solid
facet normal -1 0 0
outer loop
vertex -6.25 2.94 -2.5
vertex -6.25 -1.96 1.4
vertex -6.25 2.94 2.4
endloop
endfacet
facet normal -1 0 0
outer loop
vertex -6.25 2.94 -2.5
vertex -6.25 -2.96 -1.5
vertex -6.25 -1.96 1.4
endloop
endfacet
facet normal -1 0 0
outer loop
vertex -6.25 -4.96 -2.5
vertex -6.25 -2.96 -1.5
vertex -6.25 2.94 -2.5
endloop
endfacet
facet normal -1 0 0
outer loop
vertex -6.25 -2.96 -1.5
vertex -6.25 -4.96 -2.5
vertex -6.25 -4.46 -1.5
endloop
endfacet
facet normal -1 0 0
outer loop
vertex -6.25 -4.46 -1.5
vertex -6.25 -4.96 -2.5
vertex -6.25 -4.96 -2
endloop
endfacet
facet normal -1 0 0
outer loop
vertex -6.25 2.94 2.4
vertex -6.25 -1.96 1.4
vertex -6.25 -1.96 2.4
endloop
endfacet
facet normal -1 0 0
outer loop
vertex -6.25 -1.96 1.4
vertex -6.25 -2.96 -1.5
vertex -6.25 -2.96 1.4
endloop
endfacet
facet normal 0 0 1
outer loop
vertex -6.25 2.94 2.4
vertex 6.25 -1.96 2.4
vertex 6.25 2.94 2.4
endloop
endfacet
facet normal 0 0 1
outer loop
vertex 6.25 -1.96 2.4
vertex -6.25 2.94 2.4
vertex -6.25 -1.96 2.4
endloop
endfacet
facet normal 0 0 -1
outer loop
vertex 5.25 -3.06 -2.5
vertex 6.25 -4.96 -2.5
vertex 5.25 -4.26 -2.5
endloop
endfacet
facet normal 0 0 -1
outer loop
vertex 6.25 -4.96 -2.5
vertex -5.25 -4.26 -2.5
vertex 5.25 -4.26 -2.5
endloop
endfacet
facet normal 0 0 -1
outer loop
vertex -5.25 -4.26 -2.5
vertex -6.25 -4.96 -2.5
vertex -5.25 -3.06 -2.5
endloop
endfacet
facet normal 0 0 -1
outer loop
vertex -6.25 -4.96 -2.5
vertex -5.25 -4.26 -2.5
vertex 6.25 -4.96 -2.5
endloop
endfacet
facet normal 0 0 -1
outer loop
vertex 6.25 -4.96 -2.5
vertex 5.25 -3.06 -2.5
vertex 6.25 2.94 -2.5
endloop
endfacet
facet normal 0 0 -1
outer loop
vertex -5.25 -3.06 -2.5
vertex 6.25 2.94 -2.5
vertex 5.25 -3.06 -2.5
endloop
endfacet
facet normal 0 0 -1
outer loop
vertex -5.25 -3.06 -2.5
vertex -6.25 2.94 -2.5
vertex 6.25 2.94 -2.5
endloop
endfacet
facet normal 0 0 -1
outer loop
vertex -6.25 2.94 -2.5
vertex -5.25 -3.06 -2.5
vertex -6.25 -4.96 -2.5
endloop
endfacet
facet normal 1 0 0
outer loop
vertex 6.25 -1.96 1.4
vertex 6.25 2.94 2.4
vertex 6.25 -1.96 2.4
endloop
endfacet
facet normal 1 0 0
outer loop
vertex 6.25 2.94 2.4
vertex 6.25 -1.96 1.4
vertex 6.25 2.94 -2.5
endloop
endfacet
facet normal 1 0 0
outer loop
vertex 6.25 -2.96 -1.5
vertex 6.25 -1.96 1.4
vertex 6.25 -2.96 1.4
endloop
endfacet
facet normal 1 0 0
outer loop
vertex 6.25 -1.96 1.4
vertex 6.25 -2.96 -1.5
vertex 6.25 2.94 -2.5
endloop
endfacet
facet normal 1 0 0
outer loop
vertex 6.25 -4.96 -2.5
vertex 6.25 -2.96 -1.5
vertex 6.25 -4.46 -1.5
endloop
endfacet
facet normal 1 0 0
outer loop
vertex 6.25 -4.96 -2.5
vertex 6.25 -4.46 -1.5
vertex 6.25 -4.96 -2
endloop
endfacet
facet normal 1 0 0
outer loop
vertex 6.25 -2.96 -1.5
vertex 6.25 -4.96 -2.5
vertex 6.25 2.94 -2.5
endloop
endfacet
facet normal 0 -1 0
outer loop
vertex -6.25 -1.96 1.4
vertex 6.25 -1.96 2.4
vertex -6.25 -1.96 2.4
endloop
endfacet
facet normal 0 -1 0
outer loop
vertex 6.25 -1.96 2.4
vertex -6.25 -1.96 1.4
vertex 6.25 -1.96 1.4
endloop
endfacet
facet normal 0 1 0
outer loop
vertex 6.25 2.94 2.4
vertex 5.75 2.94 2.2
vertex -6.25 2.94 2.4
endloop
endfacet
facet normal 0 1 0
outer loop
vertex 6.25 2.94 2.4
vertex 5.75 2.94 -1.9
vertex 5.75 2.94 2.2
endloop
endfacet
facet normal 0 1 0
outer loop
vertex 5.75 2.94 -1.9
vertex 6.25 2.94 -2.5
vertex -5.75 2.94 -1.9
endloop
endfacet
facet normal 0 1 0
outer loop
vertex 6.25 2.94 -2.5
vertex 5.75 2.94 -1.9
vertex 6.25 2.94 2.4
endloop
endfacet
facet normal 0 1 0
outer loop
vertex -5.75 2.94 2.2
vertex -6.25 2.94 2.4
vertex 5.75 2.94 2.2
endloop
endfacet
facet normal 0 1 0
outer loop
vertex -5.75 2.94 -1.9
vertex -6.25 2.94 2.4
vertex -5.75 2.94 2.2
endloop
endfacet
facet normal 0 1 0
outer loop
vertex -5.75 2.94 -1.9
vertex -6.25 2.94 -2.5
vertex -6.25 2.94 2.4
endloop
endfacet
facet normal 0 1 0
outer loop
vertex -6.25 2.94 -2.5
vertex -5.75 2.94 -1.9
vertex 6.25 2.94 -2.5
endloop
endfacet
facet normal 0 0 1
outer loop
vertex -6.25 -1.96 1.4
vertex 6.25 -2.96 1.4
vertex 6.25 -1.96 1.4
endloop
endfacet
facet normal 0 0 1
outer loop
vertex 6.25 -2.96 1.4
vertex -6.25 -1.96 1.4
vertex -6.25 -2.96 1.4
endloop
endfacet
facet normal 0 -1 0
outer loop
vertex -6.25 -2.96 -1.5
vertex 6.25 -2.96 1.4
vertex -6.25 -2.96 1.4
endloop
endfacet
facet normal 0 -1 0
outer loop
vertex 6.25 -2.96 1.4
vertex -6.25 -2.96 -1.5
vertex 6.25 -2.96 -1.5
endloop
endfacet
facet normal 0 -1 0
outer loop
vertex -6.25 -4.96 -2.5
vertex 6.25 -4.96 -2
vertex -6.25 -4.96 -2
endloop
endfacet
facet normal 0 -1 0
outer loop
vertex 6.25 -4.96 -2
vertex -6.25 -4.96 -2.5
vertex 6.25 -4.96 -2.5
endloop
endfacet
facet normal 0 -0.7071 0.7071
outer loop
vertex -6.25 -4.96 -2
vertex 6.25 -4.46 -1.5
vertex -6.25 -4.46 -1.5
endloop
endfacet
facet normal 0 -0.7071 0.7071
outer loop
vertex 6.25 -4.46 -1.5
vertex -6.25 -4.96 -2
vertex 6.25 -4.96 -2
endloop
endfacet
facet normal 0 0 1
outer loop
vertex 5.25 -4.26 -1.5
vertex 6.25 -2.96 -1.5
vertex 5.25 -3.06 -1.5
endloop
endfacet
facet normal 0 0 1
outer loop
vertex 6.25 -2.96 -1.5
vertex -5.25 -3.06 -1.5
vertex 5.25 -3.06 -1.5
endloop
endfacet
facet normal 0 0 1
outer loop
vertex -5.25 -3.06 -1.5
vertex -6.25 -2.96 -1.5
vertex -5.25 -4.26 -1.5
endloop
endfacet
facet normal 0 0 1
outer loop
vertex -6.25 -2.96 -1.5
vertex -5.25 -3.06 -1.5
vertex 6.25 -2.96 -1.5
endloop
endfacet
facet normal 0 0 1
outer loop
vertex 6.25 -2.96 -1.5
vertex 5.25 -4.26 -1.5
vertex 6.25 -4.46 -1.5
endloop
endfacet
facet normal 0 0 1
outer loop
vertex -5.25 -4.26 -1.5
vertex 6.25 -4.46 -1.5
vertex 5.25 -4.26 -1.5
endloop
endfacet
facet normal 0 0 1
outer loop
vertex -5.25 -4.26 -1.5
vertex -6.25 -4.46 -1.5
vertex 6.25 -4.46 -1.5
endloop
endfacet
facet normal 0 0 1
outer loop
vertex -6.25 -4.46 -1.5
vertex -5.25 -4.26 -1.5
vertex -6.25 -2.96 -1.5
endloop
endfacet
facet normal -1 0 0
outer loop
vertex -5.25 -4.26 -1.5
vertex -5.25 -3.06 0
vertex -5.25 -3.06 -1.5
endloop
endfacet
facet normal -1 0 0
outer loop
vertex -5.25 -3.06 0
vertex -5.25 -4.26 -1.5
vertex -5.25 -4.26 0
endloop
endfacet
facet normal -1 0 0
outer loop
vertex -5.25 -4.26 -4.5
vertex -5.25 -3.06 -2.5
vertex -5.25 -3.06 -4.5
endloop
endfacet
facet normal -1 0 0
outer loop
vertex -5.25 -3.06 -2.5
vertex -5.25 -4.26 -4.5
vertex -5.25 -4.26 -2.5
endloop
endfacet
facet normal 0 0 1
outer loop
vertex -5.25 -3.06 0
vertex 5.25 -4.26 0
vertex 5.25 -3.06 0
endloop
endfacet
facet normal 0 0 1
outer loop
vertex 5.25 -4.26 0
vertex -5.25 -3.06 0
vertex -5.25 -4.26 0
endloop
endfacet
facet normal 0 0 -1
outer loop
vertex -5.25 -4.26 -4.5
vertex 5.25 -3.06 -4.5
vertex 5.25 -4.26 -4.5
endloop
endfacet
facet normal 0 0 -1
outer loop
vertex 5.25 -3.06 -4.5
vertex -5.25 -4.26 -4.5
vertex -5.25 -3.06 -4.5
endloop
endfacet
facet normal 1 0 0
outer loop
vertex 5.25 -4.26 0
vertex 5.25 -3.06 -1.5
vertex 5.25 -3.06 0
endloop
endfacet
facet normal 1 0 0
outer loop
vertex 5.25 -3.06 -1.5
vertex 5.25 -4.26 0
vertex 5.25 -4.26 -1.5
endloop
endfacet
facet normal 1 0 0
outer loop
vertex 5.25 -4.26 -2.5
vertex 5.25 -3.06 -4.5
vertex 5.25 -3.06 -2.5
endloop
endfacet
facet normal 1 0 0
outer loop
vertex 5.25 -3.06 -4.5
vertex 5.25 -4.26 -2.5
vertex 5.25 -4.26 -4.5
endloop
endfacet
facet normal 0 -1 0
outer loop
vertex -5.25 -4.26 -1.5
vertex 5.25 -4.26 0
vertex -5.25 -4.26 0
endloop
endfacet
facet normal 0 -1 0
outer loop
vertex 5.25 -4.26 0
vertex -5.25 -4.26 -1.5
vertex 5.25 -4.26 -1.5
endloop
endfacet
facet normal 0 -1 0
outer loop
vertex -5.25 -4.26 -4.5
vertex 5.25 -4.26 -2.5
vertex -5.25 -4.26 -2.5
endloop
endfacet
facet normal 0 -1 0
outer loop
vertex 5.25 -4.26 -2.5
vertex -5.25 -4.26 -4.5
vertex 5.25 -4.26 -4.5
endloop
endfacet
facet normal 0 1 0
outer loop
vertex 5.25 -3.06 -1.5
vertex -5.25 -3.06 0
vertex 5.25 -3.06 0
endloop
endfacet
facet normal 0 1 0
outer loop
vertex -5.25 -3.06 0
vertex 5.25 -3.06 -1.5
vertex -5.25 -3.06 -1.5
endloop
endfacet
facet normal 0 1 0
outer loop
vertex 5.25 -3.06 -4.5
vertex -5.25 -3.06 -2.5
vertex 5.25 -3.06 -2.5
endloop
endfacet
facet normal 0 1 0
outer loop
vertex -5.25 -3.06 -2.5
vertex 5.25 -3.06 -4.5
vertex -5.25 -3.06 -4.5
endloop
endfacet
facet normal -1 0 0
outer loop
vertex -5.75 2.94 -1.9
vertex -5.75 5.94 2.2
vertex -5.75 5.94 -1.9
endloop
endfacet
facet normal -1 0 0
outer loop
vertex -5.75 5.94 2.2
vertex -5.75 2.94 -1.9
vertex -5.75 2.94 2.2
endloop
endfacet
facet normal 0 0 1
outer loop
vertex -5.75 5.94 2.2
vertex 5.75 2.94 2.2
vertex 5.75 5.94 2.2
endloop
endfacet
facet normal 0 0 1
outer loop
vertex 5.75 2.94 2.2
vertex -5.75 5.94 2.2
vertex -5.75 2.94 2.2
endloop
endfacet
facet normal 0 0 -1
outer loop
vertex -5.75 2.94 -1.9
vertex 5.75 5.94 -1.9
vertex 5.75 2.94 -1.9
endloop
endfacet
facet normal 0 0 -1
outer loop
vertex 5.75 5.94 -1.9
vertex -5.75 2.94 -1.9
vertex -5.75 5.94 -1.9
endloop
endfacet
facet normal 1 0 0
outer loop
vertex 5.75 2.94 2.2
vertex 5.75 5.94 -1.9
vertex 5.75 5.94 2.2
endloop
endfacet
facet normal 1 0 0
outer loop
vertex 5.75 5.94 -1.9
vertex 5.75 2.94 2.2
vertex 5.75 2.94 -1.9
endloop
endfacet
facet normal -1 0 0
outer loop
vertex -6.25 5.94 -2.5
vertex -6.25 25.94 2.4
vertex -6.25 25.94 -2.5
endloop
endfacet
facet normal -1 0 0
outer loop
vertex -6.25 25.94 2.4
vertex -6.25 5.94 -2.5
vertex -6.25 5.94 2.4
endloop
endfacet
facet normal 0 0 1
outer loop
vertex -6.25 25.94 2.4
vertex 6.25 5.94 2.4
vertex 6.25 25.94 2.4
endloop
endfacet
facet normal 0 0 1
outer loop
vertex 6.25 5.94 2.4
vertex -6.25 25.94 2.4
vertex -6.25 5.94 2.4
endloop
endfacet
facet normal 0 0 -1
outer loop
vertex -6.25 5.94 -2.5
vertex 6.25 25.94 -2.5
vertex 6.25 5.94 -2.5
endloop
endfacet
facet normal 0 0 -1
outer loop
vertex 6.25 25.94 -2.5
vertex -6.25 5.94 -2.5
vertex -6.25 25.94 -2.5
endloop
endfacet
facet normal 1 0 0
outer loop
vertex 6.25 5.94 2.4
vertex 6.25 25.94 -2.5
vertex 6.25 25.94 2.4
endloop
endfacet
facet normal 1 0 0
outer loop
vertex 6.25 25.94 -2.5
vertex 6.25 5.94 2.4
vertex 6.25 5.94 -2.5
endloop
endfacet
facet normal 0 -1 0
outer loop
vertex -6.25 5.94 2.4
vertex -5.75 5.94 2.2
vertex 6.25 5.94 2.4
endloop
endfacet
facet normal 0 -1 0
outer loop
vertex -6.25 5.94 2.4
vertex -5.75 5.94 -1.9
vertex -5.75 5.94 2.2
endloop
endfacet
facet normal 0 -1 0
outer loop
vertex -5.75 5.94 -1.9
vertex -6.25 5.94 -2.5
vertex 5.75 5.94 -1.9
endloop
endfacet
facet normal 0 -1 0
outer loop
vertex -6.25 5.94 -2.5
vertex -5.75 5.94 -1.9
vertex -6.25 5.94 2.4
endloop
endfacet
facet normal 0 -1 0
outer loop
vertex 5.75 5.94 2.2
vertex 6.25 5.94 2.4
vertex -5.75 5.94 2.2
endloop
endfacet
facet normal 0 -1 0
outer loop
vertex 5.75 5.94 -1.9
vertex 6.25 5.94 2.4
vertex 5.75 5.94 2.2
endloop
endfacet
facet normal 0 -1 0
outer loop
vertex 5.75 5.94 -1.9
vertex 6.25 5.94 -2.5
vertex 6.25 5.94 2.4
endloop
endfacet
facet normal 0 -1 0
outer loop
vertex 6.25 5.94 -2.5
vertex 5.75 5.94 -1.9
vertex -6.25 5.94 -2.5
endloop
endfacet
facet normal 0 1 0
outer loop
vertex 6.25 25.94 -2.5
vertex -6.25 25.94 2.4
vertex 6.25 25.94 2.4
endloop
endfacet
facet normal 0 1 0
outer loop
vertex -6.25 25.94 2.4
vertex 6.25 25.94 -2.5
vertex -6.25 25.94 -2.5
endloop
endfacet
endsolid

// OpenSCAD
N=4;
A=2.5+N*2.5;
rotate([0,0,180])
translate([-A/2,-2.94,-2.5])
{
	cube([A,4.9,4.9]);
	cube([A,5.9,3.9]);
	hull()
	{
		cube([A,7.4,1]);
		cube([A,7.9,0.5]);
	}
	translate([1,6,-2])cube([A-2,1.2,4.5]); // Assumes cropped pins
	// Plug
	translate([0.5,-20,0.6])cube([A-1,21,4.1]);
	translate([0,-23,0])cube([A,20,4.9]);
}
